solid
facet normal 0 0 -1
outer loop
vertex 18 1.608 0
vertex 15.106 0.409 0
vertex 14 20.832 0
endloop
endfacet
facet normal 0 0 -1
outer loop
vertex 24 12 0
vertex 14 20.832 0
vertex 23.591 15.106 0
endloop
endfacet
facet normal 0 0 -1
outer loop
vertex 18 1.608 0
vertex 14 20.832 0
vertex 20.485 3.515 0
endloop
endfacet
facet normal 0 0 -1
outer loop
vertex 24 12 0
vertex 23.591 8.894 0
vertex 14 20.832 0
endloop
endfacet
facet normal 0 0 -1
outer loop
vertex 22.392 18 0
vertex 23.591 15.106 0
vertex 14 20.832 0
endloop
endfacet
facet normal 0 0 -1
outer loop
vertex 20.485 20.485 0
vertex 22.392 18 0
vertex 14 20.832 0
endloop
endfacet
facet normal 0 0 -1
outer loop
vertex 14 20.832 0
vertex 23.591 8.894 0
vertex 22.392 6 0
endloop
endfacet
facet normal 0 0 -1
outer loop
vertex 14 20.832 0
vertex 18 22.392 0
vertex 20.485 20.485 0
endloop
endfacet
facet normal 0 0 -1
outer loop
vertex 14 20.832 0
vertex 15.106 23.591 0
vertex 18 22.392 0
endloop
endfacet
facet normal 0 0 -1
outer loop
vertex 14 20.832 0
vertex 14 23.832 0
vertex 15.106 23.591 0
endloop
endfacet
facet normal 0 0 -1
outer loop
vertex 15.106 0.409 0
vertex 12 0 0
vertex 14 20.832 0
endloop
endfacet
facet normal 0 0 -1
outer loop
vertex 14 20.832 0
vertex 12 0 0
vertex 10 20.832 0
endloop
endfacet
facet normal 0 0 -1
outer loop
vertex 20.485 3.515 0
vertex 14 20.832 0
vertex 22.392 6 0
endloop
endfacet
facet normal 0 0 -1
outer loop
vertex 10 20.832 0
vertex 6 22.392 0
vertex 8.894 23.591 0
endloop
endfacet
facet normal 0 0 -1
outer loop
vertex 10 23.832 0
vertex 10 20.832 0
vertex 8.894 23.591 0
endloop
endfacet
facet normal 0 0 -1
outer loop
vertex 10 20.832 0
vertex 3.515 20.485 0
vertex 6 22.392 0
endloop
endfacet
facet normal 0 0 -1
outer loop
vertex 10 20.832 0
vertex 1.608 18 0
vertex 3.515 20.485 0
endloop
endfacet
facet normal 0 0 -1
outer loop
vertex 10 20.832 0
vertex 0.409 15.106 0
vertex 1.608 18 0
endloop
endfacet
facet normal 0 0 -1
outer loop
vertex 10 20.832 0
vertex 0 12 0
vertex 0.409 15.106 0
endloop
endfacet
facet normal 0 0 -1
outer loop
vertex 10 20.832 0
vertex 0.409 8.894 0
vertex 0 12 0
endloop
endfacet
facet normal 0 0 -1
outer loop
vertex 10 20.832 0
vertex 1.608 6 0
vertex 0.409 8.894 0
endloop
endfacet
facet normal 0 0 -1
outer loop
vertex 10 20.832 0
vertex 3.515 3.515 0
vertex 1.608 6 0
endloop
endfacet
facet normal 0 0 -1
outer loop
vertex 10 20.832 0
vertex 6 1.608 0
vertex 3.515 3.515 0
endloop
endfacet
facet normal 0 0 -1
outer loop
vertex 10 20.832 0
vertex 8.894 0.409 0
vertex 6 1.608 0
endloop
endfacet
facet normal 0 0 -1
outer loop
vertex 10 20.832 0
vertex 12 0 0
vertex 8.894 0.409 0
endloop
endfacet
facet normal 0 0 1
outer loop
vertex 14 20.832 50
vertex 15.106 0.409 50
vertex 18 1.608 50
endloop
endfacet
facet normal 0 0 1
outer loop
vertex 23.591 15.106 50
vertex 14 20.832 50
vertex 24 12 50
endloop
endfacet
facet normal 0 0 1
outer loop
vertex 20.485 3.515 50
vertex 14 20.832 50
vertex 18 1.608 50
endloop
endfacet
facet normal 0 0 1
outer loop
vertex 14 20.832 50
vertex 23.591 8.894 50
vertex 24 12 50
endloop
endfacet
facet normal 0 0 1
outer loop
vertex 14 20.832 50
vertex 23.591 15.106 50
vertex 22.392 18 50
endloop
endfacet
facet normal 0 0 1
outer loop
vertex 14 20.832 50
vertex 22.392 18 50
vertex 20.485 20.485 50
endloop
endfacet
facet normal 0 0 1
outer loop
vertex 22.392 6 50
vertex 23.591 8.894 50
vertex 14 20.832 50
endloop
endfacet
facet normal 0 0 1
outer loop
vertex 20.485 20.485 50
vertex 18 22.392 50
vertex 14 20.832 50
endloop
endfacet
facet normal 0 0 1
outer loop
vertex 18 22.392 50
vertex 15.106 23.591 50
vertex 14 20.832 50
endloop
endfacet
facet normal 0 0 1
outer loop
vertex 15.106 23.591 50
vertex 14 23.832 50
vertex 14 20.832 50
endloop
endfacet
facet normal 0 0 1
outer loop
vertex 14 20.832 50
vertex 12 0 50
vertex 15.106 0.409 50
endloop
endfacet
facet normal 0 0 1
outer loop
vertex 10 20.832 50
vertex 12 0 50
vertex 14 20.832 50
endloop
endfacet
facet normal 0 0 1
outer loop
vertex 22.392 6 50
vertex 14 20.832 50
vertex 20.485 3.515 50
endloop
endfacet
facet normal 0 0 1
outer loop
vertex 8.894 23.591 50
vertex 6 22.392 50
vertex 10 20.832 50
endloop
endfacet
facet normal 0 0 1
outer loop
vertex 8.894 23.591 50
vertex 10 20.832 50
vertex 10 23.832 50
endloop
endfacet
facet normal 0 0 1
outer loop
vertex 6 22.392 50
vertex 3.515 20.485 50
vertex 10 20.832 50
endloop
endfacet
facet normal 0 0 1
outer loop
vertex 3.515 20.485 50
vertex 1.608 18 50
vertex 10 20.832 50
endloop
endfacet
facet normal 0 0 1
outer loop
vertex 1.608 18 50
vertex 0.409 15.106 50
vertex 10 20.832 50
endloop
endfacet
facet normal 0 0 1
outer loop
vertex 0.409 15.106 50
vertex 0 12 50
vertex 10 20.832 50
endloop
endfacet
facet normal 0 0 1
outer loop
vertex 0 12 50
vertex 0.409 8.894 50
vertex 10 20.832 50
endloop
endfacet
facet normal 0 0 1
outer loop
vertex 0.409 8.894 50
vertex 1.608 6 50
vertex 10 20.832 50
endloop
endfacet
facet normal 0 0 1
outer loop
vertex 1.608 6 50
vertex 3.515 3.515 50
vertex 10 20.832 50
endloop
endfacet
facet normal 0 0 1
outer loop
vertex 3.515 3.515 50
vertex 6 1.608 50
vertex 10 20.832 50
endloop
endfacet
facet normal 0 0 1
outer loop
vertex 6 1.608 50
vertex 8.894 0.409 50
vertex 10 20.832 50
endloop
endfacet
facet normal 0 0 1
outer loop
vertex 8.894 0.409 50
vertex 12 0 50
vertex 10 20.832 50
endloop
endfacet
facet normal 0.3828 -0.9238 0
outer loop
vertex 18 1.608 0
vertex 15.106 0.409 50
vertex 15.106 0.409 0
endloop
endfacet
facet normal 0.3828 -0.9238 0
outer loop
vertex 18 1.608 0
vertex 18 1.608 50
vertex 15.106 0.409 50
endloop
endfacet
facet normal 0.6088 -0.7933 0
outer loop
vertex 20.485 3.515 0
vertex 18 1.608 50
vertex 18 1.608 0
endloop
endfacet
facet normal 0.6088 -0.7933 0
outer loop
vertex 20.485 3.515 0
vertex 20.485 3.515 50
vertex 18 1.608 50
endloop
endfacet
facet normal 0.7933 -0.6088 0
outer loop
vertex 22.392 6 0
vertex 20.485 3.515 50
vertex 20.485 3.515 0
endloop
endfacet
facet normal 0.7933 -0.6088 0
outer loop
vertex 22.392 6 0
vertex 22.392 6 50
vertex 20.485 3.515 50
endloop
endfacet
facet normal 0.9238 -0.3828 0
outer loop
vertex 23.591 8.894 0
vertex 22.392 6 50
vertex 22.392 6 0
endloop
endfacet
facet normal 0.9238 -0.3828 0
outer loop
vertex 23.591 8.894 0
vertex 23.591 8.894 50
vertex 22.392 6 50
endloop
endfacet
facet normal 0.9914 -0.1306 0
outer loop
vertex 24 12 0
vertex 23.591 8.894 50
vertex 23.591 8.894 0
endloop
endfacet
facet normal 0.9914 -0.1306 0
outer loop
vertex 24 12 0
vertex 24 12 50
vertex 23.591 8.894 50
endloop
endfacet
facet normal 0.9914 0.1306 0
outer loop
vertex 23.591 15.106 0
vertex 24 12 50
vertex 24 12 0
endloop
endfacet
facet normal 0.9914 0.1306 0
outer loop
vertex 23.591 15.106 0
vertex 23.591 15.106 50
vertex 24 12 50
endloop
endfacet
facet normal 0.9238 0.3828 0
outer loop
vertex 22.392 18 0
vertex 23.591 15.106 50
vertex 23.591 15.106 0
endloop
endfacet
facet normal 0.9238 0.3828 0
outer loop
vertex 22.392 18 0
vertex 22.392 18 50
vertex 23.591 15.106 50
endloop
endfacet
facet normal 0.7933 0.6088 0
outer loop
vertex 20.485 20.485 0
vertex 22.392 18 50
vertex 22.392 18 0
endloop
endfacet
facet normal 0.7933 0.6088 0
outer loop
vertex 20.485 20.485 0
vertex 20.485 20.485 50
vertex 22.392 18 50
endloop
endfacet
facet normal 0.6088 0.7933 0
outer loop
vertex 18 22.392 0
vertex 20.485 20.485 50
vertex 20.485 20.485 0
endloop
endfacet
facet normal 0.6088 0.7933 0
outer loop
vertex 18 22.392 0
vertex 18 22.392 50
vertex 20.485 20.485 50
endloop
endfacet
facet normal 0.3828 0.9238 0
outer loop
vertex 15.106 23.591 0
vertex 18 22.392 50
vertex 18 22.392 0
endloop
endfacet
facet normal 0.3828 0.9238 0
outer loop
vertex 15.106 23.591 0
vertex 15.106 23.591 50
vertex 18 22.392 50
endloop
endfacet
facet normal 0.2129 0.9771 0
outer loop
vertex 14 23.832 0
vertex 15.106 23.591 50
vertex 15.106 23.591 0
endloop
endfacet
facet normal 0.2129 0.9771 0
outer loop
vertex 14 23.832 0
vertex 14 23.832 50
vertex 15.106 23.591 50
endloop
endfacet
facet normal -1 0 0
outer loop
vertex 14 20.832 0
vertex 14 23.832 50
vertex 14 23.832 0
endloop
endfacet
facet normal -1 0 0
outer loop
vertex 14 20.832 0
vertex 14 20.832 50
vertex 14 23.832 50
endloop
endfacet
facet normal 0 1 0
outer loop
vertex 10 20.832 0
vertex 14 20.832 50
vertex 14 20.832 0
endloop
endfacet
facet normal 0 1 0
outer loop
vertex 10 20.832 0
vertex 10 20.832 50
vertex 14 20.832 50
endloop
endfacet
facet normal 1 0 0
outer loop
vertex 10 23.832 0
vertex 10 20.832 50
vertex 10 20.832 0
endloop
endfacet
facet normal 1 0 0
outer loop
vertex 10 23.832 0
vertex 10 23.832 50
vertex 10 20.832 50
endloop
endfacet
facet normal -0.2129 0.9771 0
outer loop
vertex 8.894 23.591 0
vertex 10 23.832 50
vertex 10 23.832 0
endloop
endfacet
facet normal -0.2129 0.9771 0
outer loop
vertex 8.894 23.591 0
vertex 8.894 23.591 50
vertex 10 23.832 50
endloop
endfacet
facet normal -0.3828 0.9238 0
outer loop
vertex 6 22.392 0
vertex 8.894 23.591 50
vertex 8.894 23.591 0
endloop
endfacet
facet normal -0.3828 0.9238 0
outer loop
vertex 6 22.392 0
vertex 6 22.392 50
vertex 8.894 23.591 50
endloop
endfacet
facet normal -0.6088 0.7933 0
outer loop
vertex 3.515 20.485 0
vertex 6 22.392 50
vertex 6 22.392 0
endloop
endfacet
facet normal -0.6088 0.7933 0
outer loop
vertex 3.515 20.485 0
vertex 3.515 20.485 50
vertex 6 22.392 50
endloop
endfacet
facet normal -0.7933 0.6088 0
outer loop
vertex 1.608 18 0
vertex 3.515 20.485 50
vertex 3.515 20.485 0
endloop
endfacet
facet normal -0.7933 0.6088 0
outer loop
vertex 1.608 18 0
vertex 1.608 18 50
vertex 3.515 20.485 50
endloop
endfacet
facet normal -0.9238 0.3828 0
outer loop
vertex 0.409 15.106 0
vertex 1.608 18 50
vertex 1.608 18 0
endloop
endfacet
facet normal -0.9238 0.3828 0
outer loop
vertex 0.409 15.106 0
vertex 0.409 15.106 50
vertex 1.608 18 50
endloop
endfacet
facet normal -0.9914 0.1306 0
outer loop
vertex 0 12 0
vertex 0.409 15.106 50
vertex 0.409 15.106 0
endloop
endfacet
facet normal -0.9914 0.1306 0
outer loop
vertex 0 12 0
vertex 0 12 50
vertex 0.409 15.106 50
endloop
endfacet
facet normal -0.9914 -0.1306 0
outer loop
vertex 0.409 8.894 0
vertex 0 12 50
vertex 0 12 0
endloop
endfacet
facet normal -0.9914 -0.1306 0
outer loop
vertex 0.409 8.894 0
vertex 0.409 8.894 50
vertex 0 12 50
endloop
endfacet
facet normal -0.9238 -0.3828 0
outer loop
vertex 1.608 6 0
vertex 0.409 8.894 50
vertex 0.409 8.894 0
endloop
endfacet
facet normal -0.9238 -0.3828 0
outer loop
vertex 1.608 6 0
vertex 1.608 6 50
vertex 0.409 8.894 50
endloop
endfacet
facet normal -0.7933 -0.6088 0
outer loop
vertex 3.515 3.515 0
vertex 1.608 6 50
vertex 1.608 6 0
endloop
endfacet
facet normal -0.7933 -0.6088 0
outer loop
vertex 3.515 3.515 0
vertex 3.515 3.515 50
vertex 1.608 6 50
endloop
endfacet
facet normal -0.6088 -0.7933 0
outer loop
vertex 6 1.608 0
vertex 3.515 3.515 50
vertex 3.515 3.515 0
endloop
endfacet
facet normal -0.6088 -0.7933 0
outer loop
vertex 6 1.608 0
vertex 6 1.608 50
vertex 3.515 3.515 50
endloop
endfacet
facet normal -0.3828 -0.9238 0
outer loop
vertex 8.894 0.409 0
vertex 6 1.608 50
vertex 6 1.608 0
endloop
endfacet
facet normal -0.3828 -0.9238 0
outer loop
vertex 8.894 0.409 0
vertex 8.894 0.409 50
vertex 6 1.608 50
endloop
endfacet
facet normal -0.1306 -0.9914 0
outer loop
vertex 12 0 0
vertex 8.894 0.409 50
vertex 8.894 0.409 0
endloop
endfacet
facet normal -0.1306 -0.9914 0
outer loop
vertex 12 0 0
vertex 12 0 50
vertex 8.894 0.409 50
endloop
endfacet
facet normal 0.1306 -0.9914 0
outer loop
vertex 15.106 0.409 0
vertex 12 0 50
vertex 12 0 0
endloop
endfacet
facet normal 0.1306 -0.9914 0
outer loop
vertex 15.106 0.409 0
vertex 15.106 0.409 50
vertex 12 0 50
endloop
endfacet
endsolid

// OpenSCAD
$fn = 32;

// ----------------------------------------------------------------------
// Keyway shaft: d24 shaft, key 4 x 3 mm
// ----------------------------------------------------------------------

// --- parameters (mm) ---
shaft_r = 12;             // shaft radius
key_w = 4;                // keyway width
key_d = 3;                // keyway depth below the surface line
plate_t = 50;             // shaft length, Z (extrusion height)

shaft_d = 2 * shaft_r;  // shaft diameter
circle_step = 15;  // polygon sampling step, degrees

profile = [[8.894, 23.591], [6, 22.392], [3.515, 20.485], [1.608, 18], [0.409, 15.106], [0, 12], [0.409, 8.894], [1.608, 6], [3.515, 3.515], [6, 1.608], [8.894, 0.409], [12, 0], [15.106, 0.409], [18, 1.608], [20.485, 3.515], [22.392, 6], [23.591, 8.894], [24, 12], [23.591, 15.106], [22.392, 18], [20.485, 20.485], [18, 22.392], [15.106, 23.591], [14, 23.832], [14, 20.832], [10, 20.832], [10, 23.832]];  // primary outline, 27 points, counter clockwise

// --- the one profile operation ---
linear_extrude(height = plate_t) polygon(points = profile);
